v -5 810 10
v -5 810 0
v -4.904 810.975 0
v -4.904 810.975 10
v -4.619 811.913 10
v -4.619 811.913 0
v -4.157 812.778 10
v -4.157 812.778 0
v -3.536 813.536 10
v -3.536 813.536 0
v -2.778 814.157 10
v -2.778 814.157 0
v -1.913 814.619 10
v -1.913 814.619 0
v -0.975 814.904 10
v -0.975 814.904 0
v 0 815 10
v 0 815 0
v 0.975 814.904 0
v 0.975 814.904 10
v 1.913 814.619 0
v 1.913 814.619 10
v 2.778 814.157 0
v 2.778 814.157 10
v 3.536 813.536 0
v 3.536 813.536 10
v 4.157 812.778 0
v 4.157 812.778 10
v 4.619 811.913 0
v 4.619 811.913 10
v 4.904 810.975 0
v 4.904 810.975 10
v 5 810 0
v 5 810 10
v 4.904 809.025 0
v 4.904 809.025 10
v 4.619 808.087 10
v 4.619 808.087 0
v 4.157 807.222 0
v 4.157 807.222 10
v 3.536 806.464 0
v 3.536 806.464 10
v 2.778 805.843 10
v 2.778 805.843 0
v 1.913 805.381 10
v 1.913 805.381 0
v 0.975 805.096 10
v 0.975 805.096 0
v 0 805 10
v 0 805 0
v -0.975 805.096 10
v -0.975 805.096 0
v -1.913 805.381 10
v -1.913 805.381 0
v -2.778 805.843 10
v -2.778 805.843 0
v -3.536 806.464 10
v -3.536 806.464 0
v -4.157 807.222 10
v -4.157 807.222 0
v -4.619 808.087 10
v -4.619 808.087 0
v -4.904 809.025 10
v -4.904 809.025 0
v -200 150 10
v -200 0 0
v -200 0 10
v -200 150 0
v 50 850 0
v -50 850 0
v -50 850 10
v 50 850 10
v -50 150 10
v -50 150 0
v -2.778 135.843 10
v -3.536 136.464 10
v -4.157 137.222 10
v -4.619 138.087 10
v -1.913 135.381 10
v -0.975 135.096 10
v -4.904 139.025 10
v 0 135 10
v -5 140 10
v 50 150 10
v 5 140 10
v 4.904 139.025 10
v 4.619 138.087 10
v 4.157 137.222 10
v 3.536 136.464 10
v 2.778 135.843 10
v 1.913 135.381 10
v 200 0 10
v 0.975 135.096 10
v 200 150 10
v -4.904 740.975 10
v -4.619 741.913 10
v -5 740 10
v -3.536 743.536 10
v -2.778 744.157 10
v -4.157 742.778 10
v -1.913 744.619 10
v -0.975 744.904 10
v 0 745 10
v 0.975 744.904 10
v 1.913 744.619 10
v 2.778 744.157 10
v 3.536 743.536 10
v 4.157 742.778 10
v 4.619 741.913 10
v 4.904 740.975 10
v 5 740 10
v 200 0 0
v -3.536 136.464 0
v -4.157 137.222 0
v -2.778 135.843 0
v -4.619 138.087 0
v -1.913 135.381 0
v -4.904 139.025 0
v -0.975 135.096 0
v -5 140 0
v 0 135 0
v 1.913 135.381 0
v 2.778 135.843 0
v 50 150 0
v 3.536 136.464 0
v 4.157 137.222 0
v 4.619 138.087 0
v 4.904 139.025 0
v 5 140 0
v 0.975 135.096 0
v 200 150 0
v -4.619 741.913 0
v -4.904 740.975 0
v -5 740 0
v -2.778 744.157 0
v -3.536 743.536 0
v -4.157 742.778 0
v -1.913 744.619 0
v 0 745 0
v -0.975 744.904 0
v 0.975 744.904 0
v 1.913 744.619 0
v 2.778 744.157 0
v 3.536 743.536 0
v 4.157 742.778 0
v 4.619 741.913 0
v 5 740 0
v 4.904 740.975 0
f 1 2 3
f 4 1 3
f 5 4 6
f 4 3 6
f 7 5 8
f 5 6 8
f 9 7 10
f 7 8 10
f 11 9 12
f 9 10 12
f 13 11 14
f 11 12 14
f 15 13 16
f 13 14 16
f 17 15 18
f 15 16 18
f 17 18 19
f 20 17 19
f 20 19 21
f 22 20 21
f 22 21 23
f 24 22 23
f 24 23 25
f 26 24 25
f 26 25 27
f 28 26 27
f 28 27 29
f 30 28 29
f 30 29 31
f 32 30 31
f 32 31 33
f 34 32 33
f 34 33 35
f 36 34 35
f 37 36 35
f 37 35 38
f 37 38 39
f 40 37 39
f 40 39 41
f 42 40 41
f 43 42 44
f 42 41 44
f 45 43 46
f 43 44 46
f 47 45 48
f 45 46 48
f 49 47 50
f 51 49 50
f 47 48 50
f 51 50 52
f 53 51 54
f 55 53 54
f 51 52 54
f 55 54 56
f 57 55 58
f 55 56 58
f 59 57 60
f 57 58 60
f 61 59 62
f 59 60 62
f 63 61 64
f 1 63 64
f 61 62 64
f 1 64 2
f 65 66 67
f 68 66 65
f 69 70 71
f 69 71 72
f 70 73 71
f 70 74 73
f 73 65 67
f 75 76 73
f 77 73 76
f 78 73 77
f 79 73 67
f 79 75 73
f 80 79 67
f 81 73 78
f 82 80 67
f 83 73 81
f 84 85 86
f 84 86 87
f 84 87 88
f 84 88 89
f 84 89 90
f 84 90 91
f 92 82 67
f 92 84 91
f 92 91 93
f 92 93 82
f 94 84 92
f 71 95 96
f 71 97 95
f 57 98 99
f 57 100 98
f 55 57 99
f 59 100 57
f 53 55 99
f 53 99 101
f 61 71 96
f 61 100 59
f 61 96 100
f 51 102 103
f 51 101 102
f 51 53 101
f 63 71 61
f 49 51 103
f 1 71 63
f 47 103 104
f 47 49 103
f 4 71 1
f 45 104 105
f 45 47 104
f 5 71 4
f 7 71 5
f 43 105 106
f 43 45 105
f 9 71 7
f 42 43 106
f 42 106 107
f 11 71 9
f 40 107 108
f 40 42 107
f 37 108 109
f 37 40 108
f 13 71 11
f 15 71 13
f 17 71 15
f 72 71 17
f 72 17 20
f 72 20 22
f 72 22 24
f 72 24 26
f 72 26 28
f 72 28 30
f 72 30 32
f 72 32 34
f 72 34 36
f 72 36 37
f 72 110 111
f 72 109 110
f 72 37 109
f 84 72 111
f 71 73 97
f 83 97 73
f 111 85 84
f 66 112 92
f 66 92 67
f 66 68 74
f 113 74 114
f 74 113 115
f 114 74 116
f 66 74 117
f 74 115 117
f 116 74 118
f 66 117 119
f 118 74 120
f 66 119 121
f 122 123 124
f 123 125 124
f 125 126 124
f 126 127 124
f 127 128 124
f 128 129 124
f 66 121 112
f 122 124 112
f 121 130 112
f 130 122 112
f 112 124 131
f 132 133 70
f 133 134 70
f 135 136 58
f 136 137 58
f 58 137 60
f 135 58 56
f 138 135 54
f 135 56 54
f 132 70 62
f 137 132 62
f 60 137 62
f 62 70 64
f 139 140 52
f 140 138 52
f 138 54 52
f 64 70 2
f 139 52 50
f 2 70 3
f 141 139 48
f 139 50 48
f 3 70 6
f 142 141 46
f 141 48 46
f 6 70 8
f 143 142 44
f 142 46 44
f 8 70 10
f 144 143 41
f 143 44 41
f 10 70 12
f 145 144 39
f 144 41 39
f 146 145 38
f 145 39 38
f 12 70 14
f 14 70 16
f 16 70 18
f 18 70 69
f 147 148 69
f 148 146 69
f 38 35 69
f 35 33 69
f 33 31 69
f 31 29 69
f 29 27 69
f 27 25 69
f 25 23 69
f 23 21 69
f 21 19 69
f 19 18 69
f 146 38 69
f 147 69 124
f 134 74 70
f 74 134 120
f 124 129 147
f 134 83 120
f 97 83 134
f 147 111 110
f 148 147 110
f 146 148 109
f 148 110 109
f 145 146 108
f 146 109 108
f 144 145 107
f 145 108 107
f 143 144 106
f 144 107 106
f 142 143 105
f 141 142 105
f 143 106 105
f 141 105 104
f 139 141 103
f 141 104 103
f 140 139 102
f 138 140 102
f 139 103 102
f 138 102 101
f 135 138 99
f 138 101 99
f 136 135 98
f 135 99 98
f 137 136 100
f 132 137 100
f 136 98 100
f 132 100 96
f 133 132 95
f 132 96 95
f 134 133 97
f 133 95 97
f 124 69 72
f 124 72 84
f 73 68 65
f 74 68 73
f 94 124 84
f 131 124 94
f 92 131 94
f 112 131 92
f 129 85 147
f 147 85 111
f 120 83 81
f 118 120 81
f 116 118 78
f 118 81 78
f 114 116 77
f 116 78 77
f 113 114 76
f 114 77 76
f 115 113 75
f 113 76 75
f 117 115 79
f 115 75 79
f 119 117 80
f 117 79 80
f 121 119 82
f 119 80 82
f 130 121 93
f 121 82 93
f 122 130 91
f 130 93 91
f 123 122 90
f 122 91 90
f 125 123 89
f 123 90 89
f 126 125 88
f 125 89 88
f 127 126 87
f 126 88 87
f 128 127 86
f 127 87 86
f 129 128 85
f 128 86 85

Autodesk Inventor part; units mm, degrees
ref_plane "YZ Plane" through (0, 0, 0) normal (1, 0, 0) x (0, 1, 0)
ref_plane "XZ Plane" through (0, 0, 0) normal (0, 1, 0) x (-1, 0, 0)
ref_plane "XY Plane" through (0, 0, 0) normal (0, 0, 1) x (1, 0, 0)
sketch "Sketch1" plane through (0, 0, 0) normal (0, 0, 1) x (1, 0, 0)
  line L0 (-200, 0) -> (-200, 150)
  line L1 (-200, 150) -> (200, 150)
  line L2 (200, 150) -> (200, 0)
  line L3 (200, 0) -> (-200, 0)
  line L4 (50, 150) -> (-50, 150)
  line L5 (-50, 150) -> (-50, 850)
  line L6 (-50, 850) -> (50, 850)
  line L7 (50, 850) -> (50, 150)
  line L8 (0, -170) -> (0, 1020) projected
  line L9 (-280, 0) -> (280, 0) projected
  point P0 (0, 0)
  dimension "d7" = 700
  dimension "d11" = 50
  dimension "d12" = 50
  dimension "d13" = 200
  dimension "d14" = 200
  dimension "d15" = 150
  dimension "d17" = 200
  dimension "d18" = 200
extrude "Extrusion2" add sketch "Sketch1" along normal blind 10
sketch "Sketch2" plane through (0, 0, 10) normal (0, 0, 1) x (1, 0, 0)
  line L0 (5, 140) -> (5, 740)
  line L1 (0, -170) -> (0, 1020) projected
  line L2 (-280, 0) -> (280, 0) projected
  arc A0 (0, 135) -> (5, 140) centre (0, 140) ccw
  line L3 (-5, 140) -> (-5, 740)
  arc A1 (-5, 140) -> (0, 135) centre (0, 140) ccw
  arc A2 (5, 740) -> (-5, 740) centre (0, 740) ccw
  line L4 (50, 850) -> (-50, 850) projected
  point P0 (0, 0)
  point P1 (0, 149.3301)
  dimension "d8" = 5
  dimension "d24" = 600
  dimension "d26" = 10
  dimension "d30" = 10
  dimension "d34" = 110
sketch "Sketch3" plane through (0, 0, 0) normal (0, 0, -1) x (-1, 0, 0)
  line L0 (0, -170) -> (0, 1020) projected
  line L1 (280, 0) -> (-280, 0) projected
  circle A0 centre (0, 810) radius 5
  line L2 (-50, 850) -> (50, 850) projected
  point P0 (0, 0)
  dimension "d19" = 10
  dimension "d27" = 40
extrude "Extrusion4" cut sketch "Sketch3" against normal through all
extrude "Extrusion6" cut sketch "Sketch2" against normal through all
